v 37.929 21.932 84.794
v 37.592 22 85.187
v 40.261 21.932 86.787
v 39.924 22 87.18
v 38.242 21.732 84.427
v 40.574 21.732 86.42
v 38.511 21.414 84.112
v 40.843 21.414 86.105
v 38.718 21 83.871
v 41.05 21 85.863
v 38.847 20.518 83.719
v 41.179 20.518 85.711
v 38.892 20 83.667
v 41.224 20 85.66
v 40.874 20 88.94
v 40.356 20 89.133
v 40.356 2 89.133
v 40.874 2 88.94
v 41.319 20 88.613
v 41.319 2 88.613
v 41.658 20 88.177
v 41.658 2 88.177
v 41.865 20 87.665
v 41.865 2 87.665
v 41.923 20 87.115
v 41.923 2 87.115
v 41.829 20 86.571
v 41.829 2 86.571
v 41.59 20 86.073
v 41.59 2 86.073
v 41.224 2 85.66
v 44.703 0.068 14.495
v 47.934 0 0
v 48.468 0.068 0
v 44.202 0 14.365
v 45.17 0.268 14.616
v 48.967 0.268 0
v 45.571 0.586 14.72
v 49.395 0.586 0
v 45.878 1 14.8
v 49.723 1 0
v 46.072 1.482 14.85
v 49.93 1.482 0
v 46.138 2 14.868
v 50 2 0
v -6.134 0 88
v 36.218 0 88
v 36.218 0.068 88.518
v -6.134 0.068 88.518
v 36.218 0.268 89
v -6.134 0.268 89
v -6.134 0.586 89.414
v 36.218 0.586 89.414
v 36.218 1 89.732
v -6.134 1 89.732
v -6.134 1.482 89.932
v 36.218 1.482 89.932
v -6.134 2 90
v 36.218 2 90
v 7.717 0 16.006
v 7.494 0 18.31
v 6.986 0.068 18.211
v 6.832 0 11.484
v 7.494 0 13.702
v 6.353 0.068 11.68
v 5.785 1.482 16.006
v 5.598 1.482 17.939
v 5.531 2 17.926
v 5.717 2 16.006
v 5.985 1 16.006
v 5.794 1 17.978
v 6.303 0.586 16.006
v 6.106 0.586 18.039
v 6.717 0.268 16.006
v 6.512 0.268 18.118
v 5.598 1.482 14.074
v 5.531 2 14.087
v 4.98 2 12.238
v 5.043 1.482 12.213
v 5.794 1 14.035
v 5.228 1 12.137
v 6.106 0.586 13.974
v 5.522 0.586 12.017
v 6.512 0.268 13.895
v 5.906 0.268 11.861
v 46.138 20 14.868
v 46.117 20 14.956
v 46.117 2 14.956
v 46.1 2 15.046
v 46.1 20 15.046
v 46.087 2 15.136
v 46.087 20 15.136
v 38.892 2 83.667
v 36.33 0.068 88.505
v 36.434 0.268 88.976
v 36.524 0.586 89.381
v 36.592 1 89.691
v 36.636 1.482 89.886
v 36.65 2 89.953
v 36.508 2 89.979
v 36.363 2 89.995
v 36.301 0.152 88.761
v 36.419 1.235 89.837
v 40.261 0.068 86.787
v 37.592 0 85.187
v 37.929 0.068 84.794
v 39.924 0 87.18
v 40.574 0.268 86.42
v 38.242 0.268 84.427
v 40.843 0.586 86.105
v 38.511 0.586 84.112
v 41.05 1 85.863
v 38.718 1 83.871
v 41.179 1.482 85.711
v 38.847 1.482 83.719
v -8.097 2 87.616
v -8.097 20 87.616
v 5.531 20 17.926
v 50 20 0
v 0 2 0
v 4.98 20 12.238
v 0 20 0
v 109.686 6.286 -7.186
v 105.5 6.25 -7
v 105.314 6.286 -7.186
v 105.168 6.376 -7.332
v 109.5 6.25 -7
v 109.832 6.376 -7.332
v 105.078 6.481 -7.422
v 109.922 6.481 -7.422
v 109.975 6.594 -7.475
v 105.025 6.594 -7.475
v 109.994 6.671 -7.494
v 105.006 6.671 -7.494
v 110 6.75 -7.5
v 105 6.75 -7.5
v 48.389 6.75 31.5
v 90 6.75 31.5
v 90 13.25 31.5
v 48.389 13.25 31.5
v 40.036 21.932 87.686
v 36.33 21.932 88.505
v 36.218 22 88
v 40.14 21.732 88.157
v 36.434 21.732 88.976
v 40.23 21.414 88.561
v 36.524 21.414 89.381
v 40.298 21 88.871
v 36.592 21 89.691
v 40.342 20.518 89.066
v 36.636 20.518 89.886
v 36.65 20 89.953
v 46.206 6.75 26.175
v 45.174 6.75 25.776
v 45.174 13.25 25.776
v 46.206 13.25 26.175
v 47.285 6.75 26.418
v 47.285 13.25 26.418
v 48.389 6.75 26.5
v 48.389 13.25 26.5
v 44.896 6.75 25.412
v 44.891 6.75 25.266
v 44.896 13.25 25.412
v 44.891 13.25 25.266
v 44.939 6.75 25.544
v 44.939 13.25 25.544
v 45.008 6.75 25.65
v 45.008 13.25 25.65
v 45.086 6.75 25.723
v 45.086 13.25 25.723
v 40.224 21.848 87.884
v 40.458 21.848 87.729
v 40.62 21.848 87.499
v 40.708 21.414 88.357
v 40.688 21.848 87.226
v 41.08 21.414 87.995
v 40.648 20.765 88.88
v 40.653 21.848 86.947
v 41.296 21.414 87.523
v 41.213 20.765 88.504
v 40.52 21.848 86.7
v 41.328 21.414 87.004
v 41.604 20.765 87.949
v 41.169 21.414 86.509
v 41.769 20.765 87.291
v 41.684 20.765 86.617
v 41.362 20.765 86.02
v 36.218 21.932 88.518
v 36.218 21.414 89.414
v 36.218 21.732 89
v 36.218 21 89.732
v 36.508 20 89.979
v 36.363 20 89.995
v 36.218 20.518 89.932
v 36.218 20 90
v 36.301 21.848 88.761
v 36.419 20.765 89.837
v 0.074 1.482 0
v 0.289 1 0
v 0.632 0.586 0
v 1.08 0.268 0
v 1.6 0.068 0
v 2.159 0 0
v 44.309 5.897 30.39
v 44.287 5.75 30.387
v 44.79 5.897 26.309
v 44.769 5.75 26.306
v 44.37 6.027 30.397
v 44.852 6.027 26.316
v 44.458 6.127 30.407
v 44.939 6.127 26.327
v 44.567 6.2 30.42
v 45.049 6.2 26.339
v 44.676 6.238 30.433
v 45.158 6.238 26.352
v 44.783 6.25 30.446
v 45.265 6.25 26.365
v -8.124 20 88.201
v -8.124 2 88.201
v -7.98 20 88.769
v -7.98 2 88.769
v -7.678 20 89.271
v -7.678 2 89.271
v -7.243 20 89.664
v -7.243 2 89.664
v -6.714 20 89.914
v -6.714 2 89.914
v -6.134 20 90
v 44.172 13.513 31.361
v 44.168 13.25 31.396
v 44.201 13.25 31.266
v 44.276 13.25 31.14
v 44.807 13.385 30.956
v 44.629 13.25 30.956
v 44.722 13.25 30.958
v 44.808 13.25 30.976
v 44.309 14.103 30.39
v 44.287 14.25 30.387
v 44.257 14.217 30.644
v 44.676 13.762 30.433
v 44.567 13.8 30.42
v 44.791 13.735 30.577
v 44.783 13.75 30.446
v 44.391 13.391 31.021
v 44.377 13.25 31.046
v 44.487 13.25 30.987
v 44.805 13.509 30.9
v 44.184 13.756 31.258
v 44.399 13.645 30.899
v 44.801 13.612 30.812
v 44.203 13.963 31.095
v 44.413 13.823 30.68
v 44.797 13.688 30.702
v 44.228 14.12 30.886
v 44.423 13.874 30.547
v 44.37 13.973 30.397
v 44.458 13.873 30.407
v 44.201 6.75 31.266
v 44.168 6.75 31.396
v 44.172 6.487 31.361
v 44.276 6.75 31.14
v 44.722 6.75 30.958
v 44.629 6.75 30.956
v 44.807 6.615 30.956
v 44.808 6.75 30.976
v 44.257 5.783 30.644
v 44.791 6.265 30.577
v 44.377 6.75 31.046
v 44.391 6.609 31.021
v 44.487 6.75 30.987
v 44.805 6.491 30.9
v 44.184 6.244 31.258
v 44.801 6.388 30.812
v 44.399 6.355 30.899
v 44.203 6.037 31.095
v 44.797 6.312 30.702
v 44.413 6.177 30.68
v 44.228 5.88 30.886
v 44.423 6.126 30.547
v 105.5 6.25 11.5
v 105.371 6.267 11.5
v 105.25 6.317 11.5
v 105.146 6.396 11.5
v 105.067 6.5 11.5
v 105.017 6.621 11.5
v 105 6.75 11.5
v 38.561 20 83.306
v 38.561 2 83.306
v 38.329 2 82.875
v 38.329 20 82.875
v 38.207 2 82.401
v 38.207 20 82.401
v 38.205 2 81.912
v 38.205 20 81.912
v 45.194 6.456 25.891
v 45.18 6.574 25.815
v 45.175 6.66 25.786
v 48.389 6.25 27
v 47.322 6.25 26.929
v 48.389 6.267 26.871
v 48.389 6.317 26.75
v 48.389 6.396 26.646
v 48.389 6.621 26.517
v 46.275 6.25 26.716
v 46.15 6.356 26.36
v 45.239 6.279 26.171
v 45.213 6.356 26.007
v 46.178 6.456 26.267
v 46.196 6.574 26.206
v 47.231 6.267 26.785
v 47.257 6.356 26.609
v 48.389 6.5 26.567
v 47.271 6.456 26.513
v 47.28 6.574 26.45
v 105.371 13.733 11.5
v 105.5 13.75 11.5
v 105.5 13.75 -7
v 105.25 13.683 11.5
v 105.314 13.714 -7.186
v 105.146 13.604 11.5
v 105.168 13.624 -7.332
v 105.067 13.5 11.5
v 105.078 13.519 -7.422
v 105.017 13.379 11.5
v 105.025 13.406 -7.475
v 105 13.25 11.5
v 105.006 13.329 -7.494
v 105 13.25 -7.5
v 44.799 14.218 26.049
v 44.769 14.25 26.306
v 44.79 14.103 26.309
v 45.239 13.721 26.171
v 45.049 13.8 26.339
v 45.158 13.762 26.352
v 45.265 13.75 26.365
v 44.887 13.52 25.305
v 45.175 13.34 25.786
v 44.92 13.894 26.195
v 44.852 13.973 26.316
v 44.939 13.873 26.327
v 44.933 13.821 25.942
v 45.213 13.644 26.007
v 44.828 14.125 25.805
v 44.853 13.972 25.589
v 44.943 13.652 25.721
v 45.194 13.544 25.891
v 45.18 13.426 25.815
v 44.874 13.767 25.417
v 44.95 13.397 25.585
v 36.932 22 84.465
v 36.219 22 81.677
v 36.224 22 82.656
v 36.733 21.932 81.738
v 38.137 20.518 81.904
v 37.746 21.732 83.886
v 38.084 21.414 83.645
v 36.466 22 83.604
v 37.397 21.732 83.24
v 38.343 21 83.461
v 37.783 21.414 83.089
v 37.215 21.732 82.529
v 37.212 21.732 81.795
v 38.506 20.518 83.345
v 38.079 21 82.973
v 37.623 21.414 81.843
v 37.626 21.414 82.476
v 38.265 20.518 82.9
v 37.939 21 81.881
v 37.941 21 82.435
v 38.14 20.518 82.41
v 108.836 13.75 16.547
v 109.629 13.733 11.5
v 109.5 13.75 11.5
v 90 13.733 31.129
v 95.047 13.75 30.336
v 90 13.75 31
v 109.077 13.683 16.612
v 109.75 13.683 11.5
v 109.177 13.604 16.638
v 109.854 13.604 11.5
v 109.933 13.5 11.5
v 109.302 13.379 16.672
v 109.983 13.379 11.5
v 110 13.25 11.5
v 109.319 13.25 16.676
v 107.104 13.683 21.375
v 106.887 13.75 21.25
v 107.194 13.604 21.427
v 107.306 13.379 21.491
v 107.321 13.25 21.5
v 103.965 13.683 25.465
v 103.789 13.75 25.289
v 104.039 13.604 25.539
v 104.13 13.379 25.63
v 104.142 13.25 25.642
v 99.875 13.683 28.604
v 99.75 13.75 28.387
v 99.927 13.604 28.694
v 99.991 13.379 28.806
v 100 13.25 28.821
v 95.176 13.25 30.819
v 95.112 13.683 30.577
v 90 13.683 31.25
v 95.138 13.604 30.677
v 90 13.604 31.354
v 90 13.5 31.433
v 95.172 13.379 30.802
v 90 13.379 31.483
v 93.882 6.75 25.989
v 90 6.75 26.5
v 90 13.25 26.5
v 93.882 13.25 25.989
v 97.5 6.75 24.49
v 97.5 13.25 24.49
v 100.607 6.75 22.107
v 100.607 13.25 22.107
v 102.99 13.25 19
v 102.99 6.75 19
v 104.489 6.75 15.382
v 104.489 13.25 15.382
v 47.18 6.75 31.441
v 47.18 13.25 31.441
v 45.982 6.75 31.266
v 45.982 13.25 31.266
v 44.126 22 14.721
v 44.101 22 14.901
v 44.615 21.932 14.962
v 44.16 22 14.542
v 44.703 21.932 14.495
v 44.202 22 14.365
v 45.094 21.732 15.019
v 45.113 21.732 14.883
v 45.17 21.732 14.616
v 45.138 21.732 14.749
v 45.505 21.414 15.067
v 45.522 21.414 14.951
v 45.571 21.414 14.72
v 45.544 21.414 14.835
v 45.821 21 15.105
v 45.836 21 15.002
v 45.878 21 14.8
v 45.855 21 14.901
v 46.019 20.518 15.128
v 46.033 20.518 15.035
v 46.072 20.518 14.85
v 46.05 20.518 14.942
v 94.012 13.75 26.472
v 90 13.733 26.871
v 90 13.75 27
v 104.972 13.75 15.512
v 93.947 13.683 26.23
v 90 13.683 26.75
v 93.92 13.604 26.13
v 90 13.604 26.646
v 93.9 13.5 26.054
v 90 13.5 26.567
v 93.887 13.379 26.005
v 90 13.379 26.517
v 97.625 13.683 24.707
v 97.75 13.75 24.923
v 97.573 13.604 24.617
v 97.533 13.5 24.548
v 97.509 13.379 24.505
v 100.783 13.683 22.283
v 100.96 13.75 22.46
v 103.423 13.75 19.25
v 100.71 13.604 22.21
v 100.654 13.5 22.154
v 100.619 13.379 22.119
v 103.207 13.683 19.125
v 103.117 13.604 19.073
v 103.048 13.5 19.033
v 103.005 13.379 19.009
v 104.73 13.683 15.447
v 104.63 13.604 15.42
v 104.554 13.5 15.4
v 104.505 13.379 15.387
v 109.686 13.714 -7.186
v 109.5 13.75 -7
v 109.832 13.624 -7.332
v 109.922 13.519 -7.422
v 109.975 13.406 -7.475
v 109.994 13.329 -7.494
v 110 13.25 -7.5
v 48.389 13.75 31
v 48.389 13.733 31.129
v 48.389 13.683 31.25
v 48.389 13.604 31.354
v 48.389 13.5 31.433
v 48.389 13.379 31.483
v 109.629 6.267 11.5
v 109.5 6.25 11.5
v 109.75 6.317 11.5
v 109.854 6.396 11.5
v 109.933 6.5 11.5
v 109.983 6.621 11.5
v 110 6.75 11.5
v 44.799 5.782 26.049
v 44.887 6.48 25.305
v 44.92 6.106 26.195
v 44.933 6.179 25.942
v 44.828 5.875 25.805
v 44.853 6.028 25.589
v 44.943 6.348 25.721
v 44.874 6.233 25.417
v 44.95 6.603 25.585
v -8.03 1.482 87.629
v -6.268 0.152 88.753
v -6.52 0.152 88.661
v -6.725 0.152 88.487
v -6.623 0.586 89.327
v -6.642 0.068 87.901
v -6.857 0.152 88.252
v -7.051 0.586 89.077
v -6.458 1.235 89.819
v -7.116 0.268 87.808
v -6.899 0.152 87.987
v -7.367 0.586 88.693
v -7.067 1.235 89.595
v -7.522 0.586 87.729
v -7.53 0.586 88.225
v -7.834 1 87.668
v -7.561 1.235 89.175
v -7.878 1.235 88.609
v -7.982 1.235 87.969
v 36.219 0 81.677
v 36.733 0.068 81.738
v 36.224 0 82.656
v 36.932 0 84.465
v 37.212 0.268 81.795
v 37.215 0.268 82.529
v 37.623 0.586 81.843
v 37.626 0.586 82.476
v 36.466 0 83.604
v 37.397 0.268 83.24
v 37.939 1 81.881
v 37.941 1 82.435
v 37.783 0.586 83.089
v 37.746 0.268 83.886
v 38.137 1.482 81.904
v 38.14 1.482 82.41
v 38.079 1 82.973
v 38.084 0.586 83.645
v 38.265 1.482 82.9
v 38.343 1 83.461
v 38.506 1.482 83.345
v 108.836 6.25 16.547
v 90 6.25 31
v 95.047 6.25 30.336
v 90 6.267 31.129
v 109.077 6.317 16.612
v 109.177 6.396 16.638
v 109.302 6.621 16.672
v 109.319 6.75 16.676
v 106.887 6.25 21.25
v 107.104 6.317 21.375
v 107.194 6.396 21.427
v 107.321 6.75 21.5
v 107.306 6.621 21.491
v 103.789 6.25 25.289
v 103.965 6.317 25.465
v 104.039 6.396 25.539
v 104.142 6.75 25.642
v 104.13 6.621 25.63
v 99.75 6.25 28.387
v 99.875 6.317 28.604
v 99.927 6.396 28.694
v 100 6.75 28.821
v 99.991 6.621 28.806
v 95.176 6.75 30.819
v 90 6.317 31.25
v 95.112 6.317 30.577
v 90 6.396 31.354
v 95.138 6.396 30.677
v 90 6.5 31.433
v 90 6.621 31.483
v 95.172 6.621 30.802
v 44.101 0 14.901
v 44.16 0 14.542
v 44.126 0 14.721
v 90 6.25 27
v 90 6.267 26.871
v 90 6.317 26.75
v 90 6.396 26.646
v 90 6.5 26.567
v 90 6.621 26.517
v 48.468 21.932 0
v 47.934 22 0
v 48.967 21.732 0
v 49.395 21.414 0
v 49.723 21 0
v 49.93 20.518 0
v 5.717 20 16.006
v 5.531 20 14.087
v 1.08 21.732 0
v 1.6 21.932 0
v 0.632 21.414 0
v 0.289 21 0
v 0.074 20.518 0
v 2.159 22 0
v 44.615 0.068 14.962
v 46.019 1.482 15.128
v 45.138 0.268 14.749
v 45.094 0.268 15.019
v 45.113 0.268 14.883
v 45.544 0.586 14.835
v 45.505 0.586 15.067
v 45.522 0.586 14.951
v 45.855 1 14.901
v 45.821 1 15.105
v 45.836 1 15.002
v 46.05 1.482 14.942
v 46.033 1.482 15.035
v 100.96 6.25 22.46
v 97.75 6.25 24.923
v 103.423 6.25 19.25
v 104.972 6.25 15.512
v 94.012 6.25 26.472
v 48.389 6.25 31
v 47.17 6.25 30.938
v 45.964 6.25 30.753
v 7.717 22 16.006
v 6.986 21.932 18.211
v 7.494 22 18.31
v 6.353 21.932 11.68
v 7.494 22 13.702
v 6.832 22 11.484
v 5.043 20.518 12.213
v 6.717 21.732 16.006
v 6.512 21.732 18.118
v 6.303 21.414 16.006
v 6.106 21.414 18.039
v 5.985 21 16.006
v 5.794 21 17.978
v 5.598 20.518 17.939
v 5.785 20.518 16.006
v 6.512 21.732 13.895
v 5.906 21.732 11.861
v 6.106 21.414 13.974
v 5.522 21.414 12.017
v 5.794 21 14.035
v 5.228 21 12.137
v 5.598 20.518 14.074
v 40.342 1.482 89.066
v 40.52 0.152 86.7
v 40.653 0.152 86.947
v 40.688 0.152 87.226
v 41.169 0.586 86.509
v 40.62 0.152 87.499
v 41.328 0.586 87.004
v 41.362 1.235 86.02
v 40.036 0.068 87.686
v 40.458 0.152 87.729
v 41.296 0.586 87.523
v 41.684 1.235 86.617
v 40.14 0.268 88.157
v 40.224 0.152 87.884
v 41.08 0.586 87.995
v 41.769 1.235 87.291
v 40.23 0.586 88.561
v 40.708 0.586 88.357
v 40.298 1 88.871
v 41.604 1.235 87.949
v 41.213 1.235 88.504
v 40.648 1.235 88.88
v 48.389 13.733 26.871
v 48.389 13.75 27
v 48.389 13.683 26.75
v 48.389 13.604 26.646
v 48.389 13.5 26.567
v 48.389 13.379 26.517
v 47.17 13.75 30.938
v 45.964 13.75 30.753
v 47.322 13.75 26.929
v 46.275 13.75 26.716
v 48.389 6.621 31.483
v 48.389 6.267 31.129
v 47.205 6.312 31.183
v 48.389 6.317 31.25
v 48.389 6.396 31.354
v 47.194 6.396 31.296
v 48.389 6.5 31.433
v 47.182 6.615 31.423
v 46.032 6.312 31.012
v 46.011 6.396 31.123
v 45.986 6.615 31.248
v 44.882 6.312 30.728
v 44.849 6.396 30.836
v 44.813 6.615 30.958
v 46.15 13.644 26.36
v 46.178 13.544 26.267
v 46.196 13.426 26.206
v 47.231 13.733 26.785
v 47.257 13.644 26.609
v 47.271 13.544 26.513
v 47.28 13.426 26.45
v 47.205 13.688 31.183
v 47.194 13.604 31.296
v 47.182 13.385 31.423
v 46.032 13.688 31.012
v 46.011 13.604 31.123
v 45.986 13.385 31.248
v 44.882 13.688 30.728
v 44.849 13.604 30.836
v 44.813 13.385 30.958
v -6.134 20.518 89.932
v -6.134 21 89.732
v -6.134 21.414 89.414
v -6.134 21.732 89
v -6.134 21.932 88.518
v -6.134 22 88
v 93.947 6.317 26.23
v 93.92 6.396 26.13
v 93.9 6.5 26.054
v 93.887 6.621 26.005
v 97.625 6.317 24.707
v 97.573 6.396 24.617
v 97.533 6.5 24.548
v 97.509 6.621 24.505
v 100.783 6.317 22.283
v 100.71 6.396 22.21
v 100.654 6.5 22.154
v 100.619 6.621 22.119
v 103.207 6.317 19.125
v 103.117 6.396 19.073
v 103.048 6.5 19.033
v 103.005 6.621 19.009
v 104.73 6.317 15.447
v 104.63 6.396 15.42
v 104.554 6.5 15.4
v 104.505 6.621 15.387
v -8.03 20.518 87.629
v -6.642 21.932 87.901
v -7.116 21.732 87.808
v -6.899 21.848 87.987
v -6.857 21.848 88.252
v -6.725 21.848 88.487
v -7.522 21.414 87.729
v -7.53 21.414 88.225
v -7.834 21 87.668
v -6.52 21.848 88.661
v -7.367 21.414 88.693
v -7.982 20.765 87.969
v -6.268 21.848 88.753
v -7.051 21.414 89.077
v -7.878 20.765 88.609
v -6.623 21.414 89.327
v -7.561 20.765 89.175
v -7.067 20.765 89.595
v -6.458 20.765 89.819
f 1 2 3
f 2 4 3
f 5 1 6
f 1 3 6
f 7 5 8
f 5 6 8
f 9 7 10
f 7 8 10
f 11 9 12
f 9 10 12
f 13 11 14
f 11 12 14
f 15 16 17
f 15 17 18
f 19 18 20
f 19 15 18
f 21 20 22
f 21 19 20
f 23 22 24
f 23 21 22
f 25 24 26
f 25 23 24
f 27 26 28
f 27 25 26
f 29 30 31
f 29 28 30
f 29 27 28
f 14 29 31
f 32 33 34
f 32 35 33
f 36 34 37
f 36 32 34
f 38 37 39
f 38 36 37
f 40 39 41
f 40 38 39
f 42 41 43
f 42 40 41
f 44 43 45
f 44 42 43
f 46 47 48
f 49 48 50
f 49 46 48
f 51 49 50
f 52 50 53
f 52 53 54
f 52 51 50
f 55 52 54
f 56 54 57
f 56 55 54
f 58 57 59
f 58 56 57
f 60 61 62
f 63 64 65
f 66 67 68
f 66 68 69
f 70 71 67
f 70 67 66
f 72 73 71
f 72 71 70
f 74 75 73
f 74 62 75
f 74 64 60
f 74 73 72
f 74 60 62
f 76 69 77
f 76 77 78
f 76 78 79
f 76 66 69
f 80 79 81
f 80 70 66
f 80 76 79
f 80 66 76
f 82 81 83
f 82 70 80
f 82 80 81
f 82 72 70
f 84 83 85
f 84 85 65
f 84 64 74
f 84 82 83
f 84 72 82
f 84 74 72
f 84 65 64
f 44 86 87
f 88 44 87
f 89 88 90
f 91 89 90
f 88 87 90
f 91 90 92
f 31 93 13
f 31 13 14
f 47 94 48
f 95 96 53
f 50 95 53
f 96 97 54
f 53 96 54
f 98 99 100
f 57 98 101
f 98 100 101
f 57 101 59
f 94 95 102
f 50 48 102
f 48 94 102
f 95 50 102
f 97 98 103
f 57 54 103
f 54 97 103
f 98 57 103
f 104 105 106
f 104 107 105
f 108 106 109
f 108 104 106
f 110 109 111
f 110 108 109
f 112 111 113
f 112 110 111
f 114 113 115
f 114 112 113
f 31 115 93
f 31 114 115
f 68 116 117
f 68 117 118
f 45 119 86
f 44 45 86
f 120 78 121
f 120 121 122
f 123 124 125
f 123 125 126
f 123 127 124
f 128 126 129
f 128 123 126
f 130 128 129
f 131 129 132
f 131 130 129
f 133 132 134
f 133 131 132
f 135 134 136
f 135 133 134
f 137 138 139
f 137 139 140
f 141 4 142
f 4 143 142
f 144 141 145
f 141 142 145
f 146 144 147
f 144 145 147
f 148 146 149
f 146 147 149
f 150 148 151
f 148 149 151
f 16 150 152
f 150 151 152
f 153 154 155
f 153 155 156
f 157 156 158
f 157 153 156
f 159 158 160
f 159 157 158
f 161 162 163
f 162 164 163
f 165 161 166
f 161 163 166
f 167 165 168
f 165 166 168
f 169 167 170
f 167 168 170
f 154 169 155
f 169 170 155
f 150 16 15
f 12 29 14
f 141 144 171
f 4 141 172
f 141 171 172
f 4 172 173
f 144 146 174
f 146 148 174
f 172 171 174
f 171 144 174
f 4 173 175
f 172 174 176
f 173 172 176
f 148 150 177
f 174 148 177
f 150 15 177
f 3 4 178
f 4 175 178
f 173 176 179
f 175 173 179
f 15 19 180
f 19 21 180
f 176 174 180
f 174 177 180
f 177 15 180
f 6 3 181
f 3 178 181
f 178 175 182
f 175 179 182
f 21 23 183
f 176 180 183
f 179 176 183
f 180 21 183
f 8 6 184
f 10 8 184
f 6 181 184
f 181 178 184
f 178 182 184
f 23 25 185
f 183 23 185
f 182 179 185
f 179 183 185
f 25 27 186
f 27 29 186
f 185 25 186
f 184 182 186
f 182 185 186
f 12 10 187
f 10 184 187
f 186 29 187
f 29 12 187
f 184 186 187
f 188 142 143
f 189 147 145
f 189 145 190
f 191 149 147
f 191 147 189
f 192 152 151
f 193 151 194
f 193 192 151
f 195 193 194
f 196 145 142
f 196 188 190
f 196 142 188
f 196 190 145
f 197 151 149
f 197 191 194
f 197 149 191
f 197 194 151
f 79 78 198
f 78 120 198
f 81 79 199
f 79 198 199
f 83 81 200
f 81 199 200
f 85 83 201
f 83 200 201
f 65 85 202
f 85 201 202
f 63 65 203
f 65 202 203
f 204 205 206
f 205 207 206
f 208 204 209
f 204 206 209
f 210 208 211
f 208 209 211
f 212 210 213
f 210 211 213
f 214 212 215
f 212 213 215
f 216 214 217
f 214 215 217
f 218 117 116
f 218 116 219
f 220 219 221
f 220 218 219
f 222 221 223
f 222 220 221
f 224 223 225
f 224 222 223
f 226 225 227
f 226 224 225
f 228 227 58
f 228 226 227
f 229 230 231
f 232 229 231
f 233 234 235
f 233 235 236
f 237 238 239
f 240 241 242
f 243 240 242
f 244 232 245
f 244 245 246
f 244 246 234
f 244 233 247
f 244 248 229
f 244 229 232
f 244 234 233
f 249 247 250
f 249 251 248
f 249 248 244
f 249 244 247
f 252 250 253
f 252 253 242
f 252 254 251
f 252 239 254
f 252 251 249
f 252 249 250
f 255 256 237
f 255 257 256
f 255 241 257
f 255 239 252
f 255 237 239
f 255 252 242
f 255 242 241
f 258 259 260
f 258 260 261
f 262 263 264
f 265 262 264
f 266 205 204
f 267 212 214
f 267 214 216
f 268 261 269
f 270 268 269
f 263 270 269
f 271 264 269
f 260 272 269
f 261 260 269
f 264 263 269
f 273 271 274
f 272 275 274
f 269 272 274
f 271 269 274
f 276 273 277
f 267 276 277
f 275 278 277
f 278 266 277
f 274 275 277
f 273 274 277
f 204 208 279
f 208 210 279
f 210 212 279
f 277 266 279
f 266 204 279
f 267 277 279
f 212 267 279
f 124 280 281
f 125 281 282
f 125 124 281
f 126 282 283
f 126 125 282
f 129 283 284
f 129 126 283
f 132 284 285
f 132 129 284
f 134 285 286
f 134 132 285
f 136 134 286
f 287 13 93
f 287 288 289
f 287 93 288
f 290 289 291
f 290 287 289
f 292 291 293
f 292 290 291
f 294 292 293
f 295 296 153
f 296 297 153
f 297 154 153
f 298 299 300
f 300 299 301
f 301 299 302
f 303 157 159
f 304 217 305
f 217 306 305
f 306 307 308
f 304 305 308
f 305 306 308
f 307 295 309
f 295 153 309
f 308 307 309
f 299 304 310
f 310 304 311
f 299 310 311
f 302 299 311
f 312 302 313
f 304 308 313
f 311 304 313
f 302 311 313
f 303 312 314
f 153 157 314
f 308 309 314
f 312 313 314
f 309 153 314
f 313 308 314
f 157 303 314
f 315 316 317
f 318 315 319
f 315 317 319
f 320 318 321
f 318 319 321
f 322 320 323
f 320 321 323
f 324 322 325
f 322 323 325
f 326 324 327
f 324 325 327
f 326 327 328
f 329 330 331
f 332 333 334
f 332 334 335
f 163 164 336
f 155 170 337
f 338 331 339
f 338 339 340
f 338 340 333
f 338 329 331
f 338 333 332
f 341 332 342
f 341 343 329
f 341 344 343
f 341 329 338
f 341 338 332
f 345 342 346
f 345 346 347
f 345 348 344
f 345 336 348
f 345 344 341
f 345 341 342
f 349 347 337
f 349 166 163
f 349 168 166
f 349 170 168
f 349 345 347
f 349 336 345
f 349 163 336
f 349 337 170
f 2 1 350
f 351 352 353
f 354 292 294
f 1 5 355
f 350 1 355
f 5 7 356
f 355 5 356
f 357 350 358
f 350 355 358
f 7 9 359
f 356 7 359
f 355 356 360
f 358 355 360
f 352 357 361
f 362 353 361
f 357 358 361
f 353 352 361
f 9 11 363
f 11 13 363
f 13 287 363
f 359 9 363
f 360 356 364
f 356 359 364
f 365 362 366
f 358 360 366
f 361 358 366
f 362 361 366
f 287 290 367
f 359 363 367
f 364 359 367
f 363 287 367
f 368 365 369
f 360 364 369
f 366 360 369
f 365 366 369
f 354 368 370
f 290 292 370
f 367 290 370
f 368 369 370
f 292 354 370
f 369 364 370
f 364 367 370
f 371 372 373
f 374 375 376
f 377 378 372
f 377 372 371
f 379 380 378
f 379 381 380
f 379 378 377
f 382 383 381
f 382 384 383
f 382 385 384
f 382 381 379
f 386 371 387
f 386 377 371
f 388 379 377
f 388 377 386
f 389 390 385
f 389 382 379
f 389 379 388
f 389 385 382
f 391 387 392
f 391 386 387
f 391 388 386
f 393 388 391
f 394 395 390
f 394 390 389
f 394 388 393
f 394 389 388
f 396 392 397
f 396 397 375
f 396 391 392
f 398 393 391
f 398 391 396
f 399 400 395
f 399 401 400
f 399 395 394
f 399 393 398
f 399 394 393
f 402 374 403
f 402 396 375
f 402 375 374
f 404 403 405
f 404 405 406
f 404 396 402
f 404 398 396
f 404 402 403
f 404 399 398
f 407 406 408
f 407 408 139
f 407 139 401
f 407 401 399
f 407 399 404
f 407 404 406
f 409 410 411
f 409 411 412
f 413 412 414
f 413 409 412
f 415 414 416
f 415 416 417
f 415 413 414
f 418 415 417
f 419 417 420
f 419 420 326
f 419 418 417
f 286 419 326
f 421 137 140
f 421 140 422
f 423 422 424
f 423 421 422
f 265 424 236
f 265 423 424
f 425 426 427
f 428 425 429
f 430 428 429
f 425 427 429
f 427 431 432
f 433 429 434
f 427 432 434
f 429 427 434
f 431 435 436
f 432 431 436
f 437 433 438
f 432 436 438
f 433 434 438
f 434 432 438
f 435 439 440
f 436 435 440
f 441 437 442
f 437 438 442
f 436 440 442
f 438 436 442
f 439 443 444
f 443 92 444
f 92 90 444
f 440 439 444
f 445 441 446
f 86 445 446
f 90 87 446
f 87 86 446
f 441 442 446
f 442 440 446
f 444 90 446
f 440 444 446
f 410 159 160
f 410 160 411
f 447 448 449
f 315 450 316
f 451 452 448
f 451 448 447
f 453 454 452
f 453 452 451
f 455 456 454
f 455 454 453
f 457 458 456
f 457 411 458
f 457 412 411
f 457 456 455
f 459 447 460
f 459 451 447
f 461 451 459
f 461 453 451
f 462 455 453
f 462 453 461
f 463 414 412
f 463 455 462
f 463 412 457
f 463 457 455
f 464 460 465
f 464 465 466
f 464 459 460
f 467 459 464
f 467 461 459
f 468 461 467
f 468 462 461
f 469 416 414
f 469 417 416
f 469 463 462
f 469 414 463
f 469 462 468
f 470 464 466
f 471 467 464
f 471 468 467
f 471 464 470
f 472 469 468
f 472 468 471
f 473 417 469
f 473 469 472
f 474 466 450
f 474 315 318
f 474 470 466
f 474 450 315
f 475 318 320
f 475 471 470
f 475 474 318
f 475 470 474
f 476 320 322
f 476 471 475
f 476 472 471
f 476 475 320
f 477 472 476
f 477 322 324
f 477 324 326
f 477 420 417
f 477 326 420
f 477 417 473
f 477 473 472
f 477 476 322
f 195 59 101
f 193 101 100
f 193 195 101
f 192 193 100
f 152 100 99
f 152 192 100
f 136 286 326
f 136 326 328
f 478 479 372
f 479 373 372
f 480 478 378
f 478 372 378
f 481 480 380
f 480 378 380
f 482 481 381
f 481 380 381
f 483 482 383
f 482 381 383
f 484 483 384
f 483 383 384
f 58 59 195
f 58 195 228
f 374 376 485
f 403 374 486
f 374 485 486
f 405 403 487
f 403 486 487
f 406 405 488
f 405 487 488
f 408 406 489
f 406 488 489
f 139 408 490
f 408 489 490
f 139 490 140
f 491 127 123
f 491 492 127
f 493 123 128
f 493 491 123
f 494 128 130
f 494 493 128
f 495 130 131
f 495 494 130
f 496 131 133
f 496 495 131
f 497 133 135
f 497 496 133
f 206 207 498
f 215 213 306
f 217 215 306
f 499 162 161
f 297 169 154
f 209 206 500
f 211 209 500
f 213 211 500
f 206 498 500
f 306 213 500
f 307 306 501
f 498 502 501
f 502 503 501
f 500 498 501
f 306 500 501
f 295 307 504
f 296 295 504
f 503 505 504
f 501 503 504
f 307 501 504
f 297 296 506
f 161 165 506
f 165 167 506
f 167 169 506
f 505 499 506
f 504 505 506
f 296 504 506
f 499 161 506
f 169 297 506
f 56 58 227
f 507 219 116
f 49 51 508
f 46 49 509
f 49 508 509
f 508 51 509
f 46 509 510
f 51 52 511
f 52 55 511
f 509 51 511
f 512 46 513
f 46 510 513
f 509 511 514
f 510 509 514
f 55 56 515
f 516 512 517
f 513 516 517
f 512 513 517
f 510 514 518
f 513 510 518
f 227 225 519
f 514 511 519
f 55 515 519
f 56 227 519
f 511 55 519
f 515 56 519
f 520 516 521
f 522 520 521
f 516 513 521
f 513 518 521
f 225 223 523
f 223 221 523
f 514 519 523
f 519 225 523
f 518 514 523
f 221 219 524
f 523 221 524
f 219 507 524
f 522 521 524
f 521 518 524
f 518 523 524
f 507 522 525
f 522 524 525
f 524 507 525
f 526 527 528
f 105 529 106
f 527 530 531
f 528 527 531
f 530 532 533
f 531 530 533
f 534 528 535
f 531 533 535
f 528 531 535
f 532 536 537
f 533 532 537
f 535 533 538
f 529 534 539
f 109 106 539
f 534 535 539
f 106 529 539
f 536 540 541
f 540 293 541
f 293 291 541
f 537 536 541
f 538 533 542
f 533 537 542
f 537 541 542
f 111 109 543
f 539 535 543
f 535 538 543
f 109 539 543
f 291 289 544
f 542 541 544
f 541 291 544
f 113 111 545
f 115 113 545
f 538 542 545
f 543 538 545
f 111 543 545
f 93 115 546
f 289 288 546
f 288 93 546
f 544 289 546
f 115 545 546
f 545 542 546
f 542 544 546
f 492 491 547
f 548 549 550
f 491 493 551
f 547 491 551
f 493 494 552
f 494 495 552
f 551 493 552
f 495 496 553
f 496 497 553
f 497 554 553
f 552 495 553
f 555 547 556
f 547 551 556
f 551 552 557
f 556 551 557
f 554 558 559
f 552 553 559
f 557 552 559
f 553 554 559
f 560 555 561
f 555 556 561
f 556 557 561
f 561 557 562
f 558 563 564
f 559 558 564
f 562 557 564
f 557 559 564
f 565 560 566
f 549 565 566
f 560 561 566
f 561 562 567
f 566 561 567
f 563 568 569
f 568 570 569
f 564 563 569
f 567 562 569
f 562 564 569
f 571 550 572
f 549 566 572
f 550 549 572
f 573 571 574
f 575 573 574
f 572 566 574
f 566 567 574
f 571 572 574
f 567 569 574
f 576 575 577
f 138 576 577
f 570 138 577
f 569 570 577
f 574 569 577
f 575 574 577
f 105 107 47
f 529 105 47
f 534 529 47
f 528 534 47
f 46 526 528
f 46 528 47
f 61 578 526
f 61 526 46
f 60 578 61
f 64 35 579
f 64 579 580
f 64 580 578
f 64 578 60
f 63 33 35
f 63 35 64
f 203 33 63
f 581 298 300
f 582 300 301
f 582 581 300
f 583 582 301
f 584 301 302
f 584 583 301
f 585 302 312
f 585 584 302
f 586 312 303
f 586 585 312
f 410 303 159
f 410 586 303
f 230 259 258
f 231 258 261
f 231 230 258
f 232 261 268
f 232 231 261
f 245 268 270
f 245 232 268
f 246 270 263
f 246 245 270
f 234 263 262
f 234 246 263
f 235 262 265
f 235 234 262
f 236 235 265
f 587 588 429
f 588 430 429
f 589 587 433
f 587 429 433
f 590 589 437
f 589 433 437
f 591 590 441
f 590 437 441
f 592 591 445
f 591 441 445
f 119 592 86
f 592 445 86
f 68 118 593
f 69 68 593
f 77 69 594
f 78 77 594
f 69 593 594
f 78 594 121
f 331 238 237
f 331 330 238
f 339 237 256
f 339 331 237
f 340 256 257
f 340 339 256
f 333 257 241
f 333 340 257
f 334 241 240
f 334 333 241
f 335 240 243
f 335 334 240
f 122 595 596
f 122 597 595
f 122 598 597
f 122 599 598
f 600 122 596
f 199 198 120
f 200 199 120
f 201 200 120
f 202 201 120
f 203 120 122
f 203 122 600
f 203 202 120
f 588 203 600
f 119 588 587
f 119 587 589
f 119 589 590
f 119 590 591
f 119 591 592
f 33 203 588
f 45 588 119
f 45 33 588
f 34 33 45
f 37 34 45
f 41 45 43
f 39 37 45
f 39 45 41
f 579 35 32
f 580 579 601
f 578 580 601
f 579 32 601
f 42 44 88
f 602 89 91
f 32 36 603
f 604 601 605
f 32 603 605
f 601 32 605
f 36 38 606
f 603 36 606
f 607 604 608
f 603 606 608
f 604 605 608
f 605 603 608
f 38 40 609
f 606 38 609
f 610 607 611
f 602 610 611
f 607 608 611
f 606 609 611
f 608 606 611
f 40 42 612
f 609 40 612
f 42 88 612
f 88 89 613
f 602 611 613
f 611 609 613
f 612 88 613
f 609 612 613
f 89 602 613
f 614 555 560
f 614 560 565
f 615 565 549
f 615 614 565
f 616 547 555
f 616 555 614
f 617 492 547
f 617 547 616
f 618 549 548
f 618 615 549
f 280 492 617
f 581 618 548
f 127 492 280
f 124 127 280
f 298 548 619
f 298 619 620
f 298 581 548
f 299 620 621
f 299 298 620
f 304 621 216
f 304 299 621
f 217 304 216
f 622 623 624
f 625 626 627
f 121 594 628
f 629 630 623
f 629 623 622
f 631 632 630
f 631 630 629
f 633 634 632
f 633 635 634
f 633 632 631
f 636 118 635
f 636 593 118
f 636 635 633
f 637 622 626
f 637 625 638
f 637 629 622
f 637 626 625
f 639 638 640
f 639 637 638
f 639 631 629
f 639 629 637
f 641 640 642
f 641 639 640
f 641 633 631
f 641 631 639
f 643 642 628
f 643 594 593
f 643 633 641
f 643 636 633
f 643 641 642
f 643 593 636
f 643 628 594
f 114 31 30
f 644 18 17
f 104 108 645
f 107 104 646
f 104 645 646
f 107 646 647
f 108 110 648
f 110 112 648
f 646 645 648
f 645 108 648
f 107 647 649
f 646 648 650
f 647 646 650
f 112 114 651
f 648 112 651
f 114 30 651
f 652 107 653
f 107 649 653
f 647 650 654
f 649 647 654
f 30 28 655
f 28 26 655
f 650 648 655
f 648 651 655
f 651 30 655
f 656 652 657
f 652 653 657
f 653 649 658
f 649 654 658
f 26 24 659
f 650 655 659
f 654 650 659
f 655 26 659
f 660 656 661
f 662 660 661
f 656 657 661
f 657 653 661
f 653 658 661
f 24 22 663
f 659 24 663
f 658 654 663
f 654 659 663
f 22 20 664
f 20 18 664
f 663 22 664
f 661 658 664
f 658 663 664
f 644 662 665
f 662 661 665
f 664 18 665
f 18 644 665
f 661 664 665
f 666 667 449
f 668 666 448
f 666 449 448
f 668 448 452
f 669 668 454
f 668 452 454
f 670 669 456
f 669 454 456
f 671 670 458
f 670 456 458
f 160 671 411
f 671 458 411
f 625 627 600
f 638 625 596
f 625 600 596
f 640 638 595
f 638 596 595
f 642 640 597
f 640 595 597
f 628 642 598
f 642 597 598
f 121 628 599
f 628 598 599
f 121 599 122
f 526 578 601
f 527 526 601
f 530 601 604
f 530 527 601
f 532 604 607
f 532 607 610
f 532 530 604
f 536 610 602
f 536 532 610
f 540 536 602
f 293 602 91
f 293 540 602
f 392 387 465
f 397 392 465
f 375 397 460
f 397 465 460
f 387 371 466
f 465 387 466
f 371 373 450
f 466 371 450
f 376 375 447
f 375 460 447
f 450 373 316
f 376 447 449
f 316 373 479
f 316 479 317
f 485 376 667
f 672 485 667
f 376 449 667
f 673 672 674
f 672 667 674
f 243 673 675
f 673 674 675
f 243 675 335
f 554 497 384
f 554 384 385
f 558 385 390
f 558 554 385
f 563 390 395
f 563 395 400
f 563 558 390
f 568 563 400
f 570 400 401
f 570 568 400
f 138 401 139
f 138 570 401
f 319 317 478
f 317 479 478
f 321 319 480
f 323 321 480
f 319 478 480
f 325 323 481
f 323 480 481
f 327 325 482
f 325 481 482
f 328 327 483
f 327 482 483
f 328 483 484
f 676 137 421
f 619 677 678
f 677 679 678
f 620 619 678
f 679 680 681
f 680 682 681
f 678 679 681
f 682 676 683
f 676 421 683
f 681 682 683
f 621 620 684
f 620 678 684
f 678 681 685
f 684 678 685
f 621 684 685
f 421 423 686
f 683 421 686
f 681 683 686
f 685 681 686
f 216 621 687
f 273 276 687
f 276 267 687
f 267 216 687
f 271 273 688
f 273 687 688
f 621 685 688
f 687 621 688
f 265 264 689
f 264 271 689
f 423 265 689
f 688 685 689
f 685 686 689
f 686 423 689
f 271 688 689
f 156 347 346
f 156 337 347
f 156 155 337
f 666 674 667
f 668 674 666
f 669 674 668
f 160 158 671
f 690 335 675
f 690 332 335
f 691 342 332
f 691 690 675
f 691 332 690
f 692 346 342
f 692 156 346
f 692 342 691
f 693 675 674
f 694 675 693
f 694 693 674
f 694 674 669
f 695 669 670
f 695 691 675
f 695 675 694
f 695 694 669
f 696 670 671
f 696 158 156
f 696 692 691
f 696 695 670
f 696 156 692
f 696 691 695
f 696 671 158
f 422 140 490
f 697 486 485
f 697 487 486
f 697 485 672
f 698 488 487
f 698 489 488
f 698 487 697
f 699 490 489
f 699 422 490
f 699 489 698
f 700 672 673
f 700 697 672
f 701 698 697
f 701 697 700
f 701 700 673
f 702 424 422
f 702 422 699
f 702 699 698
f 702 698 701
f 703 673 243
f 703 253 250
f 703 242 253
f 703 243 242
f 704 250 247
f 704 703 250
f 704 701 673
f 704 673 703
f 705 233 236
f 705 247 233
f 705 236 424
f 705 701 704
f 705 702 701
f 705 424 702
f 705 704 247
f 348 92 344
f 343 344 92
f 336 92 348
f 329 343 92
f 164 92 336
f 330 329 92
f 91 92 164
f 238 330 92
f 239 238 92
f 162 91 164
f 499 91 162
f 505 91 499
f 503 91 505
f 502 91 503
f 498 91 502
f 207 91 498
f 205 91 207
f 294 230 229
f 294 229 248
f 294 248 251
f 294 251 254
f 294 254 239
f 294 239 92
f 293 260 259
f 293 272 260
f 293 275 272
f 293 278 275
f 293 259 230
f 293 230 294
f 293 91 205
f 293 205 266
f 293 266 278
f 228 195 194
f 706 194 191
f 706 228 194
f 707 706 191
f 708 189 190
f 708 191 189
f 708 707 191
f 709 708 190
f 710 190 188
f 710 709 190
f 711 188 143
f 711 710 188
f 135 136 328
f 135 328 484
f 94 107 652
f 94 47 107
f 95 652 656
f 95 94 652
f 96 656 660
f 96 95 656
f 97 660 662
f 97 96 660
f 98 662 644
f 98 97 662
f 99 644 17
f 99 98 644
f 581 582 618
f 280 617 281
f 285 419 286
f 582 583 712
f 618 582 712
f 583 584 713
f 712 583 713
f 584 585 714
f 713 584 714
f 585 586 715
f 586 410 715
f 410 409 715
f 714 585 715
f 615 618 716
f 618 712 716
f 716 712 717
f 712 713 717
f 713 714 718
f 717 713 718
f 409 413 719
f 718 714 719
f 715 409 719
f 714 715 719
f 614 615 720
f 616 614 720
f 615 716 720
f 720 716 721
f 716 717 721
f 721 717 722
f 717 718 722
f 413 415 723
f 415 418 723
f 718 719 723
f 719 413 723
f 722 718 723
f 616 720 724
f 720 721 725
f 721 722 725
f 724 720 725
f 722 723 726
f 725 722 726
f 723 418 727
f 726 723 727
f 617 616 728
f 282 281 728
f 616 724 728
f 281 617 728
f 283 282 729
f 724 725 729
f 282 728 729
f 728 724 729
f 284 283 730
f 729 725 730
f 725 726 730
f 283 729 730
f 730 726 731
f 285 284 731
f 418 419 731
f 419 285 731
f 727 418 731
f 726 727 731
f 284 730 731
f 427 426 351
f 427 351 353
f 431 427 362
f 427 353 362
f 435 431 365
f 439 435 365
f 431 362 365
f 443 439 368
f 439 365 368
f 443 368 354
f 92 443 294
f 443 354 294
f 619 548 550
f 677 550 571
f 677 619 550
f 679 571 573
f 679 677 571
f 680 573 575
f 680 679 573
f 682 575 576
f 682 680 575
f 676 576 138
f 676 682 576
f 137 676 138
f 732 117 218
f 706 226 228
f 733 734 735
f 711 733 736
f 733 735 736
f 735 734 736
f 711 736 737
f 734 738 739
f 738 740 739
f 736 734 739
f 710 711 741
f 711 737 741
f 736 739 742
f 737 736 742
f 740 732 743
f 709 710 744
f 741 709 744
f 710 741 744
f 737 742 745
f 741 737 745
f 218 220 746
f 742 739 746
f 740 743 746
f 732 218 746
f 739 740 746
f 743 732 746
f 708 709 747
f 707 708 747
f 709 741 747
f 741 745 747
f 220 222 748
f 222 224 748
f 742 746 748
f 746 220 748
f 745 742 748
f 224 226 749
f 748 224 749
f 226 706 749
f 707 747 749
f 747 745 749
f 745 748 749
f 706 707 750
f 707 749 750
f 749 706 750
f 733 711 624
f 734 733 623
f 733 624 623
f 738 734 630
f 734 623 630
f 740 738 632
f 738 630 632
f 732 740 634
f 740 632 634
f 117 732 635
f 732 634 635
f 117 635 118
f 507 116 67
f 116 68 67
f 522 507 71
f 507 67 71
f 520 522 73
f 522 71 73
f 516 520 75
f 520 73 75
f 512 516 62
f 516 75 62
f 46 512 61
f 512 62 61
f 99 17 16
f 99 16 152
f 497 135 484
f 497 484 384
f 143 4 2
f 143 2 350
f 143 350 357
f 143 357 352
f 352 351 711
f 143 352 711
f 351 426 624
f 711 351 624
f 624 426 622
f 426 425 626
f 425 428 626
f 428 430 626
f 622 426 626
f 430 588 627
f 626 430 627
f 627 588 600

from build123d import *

# Parameters (mm, degrees)
BOSS_EXTRUDE1_DEPTH = 22
FILLET1_R           = 10
FILLET1_2_R         = 2
BOSS_EXTRUDE2_START = 6.25
BOSS_EXTRUDE2_DEPTH = 7.5
FILLET2_R           = 0.5


with BuildPart() as part:
    # Sketch1 → Boss-Extrude1 (new body)
    with BuildSketch(Plane(origin=(0, 0, 0), x_dir=(1, 0, 0), z_dir=(0, 1, 0))):
        Polygon((0, 0), (50, 0), (46.103209795, -15), (38.079497445, -82.972851485), (44.273841657, -88.266236279), (36.436917163, -90), (-8.563082837, -90), (6.103209795, -15), align=None)
    extrude(amount=BOSS_EXTRUDE1_DEPTH)

    # Fillet1
    fillet1_edges = [part.edges().sort_by_distance(p)[0] for p in [
        (6.103209795, 11, 15),
    ]]
    fillet(fillet1_edges, radius=FILLET1_R)

    # Fillet1 2
    fillet1_2_edges = [part.edges().sort_by_distance(p)[0] for p in [
        (40.35537941, 0, 89.133118139),
        (13.936917163, 0, 90),
        (-1.229936521, 0, 52.5),
        (3.051604897, 0, 7.5),
        (13.936917163, 22, 90),
        (46.103209795, 11, 15),
        (38.079497445, 11, 82.972851485),
        (44.273841657, 11, 88.266236279),
        (36.436917163, 11, 90),
        (-8.563082837, 11, 90),
        (40.35537941, 22, 89.133118139),
        (41.176669551, 22, 85.619543882),
        (42.09135362, 22, 48.986425743),
        (48.051604897, 22, 7.5),
        (3.051604897, 22, 7.5),
        (-1.229936521, 22, 52.5),
        (48.051604897, 0, 7.5),
        (42.09135362, 0, 48.986425743),
        (41.176669551, 0, 85.619543882),
    ]]
    fillet(fillet1_2_edges, radius=FILLET1_2_R)

    # Sketch2 → Boss-Extrude2 (add)
    with BuildSketch(Plane(origin=(0, 0, 0), x_dir=(1, 0, 0), z_dir=(0, 1, 0)).offset(BOSS_EXTRUDE2_START)):
        with BuildLine():
            Line((105, 7.5), (110, 7.5))
            Line((110, 7.5), (110, -11.5))
            ThreePointArc((110, -11.5), (104.142135624, -25.642135624), (90, -31.5))
            Line((90, -31.5), (48.388646792, -31.5))
            ThreePointArc((48.388646792, -31.5), (46.283857117, -31.321520216), (44.239173426, -30.791177667))
            Line((44.239173426, -30.791177667), (44.850427357, -25.612942101))
            ThreePointArc((44.850427357, -25.612942101), (46.564786293, -26.27485621), (48.388646792, -26.5))
            Line((48.388646792, -26.5), (90, -26.5))
            ThreePointArc((90, -26.5), (100.606601718, -22.106601718), (105, -11.5))
            Line((105, -11.5), (105, 7.5))
        make_face()
    extrude(amount=BOSS_EXTRUDE2_DEPTH)

    # Fillet2
    fillet2_edges = [part.edges().sort_by_distance(p)[0] for p in [
        (105, 6.25, 2),
        (100.606601718, 6.25, 22.106601718),
        (69.194323396, 6.25, 26.5),
        (46.564786293, 6.25, 26.27485621),
        (44.544800391, 6.25, 28.202059884),
        (44.850427357, 10, 25.612942101),
        (46.283857117, 6.25, 31.321520216),
        (44.239173426, 10, 30.791177667),
        (69.194323396, 6.25, 31.5),
        (104.142135624, 6.25, 25.642135624),
        (110, 6.25, 2),
        (107.5, 6.25, -7.5),
        (105, 13.75, 2),
        (100.606601718, 13.75, 22.106601718),
        (69.194323396, 13.75, 26.5),
        (46.564786293, 13.75, 26.27485621),
        (44.544800391, 13.75, 28.202059884),
        (46.283857117, 13.75, 31.321520216),
        (69.194323396, 13.75, 31.5),
        (104.142135624, 13.75, 25.642135624),
        (110, 13.75, 2),
        (107.5, 13.75, -7.5),
    ]]
    fillet(fillet2_edges, radius=FILLET2_R)


solid = part.part
